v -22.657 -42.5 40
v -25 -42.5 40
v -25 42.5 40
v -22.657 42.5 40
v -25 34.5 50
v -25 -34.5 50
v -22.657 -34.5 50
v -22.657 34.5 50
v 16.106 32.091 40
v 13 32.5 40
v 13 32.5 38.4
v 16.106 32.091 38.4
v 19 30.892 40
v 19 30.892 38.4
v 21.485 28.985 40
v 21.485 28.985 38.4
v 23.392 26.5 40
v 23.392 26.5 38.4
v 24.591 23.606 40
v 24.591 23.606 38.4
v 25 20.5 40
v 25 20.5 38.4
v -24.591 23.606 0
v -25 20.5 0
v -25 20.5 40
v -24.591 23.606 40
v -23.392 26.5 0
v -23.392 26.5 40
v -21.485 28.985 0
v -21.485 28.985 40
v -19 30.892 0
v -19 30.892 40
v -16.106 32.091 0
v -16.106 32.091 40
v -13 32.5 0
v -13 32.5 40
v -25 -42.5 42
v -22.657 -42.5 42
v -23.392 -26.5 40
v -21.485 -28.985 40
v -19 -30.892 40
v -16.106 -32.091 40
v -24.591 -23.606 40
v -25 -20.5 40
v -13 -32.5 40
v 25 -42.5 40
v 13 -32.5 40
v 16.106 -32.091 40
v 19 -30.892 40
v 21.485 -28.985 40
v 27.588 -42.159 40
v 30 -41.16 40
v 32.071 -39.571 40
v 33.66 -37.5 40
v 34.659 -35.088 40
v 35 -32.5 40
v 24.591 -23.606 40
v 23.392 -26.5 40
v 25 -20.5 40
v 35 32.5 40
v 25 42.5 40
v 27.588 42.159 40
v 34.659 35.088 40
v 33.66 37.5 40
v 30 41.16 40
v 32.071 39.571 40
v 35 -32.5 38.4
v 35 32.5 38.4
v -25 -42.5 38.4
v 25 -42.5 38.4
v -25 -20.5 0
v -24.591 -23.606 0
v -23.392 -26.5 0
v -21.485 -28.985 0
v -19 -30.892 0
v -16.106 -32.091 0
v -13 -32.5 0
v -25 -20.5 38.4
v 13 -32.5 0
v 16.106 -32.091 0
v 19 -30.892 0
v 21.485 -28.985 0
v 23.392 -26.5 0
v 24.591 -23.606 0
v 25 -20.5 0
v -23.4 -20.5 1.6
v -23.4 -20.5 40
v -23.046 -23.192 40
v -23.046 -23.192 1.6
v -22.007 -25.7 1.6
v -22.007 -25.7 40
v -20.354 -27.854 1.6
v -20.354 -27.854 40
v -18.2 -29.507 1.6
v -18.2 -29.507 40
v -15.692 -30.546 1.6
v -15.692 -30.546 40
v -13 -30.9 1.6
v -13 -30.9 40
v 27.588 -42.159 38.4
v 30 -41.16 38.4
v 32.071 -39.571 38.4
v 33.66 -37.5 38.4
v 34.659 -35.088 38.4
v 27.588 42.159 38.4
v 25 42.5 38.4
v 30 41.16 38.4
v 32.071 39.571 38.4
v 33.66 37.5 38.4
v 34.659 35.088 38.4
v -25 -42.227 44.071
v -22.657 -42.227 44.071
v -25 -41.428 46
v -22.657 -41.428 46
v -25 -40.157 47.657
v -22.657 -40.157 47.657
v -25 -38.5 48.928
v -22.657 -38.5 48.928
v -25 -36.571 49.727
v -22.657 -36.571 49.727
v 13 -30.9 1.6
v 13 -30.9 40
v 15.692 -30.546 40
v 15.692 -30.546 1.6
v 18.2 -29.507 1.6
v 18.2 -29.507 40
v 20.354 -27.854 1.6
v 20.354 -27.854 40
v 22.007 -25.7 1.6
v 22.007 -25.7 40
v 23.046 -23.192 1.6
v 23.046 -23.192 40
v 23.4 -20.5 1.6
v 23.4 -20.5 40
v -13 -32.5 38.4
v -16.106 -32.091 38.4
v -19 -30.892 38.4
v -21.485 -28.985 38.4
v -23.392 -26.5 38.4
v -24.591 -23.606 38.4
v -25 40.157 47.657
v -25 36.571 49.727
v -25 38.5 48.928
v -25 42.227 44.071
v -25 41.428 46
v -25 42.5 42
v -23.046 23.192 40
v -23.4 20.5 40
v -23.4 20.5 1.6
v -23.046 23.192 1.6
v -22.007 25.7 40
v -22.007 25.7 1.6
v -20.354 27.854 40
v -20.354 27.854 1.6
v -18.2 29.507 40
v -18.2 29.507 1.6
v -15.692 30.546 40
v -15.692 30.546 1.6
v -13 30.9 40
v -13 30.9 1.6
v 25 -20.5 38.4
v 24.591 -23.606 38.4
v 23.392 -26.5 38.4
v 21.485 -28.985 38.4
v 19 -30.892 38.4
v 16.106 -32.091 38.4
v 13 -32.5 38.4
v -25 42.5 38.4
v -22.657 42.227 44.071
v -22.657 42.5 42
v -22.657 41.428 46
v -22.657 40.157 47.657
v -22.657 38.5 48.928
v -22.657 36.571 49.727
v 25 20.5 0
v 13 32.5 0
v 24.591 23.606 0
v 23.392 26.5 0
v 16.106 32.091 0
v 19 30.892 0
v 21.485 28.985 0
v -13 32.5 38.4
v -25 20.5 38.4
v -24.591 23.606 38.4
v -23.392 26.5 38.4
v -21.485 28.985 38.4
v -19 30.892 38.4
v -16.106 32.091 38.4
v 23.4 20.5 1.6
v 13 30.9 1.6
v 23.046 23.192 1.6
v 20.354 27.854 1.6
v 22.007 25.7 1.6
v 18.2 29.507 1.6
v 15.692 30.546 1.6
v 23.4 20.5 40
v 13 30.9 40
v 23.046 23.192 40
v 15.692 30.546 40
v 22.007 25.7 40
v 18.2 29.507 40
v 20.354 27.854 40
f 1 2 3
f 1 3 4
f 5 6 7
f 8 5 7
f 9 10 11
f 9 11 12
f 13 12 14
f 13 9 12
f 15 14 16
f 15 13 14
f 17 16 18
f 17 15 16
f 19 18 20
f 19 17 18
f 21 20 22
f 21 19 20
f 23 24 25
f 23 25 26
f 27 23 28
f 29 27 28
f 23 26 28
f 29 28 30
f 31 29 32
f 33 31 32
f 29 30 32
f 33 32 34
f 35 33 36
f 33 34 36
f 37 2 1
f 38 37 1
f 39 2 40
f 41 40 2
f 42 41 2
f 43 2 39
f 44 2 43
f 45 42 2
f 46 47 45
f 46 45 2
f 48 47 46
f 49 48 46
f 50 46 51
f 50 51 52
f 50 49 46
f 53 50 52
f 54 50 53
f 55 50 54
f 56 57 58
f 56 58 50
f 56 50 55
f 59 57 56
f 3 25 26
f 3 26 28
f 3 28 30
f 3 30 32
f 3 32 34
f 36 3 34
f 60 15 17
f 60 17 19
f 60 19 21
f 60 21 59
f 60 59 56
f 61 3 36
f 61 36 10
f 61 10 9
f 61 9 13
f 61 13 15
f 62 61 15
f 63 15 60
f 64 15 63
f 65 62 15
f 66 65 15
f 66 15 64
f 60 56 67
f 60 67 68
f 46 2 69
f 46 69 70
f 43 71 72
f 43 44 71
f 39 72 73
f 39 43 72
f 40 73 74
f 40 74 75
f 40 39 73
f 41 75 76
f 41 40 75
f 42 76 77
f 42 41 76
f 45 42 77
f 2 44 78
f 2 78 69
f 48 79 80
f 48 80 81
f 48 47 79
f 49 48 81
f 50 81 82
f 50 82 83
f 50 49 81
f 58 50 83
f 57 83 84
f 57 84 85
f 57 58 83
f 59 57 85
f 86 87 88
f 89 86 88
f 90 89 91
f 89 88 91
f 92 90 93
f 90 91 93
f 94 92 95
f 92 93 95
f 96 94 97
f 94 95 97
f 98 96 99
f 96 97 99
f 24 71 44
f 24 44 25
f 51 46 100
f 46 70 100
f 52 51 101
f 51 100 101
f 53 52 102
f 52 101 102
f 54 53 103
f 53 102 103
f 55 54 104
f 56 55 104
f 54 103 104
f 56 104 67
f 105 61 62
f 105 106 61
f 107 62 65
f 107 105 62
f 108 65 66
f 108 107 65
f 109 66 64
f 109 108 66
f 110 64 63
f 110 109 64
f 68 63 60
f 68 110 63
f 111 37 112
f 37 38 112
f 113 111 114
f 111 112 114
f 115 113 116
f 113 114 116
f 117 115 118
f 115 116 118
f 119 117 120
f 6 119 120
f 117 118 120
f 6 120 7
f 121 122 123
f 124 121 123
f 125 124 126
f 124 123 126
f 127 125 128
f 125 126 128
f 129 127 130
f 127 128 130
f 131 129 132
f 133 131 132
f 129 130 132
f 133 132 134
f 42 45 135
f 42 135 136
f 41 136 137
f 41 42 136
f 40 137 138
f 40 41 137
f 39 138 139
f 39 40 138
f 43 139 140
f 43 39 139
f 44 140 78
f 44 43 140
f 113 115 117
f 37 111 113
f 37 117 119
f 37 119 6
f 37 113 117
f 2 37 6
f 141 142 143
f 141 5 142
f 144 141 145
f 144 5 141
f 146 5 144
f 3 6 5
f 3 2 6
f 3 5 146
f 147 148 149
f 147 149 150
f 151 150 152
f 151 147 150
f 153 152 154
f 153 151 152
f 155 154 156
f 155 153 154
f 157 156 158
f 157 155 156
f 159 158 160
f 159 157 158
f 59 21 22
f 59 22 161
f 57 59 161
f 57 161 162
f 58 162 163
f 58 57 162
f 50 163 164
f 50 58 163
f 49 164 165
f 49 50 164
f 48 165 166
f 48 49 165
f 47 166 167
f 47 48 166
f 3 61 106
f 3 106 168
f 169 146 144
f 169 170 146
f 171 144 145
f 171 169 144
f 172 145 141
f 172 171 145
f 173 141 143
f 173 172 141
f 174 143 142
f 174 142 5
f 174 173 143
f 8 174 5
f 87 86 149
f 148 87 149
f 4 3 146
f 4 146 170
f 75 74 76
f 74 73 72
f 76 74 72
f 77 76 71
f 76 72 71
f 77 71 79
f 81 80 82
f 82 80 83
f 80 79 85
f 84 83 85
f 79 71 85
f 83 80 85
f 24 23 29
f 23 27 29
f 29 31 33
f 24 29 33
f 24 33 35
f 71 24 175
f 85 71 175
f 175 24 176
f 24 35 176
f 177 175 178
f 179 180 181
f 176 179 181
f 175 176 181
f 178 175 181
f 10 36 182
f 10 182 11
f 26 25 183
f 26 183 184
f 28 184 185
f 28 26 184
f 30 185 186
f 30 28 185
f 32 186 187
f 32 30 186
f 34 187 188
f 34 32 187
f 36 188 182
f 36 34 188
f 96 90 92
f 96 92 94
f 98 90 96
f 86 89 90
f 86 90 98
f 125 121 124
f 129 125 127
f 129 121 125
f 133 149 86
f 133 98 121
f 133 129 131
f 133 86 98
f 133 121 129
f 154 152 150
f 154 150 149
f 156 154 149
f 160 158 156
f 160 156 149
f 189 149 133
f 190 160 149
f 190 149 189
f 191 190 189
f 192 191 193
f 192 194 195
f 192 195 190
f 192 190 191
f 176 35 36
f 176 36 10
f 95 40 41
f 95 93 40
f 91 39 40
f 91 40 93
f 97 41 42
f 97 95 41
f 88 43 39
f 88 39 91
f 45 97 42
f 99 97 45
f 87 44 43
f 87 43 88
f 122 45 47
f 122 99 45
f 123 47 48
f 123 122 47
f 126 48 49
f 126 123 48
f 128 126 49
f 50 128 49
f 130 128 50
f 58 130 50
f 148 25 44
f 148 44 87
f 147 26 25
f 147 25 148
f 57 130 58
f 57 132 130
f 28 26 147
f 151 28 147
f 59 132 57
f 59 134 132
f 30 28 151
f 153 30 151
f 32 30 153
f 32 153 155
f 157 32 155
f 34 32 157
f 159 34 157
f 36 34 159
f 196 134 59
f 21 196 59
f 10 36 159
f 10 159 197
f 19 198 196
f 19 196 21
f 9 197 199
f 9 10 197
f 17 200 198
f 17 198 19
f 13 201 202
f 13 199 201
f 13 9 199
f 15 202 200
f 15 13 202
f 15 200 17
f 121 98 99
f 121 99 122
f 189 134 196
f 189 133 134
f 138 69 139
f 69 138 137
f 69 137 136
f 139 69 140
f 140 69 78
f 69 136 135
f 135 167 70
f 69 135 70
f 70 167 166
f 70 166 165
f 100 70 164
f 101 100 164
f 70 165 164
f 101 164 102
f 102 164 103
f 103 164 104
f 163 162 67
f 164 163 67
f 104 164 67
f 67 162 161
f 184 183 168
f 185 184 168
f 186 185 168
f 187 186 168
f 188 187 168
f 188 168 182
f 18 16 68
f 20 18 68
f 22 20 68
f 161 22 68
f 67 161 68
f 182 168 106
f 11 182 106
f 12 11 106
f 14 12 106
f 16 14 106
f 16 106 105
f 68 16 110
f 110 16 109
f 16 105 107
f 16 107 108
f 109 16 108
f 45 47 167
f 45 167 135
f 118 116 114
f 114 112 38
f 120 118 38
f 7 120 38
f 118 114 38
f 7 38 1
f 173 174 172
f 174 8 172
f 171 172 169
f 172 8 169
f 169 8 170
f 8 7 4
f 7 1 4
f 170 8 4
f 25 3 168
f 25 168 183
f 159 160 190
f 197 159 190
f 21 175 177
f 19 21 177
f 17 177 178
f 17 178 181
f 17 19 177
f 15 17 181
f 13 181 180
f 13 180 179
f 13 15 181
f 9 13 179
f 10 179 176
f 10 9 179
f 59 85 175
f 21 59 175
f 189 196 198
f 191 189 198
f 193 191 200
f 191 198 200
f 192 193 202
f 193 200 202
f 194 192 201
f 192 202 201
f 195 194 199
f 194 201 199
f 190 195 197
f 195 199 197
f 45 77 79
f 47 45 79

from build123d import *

# Parameters (mm, degrees)
F0_W     = 50
F0_H     = 65
F1_DEPTH = 40
F2_R     = 12
F3_T     = -1.6
F5_DEPTH = 1.6
F6_R     = 10
F7_W     = 2.3431457505
F7_H     = 85
F8_DEPTH = 10
F9_R     = 8


with BuildPart() as f1:
    # F0 (on Top) → F1 (new body)
    with BuildSketch(Plane.XY):
        Rectangle(F0_W, F0_H)
    extrude(amount=F1_DEPTH)

    # F2
    f2_edges = [f1.edges().sort_by_distance(p)[0] for p in [
        (-25, -32.5, 20),
        (25, -32.5, 20),
        (25, 32.5, 20),
        (-25, 32.5, 20),
    ]]
    fillet(f2_edges, radius=F2_R)

    # F3
    f3_openings = [f1.faces().sort_by_distance(p)[0] for p in [
        (0, 0, 40),
    ]]
    offset(amount=F3_T, openings=f3_openings)


with BuildPart() as f5:
    # F4 (on face) → F5 (new body)
    with BuildSketch(Plane.XY.offset(40)):
        with BuildLine():
            Line((35, 42.5), (-25, 42.5))
            Line((-25, 42.5), (-25, 20.5))
            ThreePointArc((-25, 20.5), (-21.4852813742, 28.9852813742), (-13, 32.5))
            Line((-13, 32.5), (13, 32.5))
            ThreePointArc((13, 32.5), (21.4852813742, 28.9852813742), (25, 20.5))
            Line((25, 20.5), (25, -20.5))
            ThreePointArc((25, -20.5), (21.4852813742, -28.9852813742), (13, -32.5))
            Line((13, -32.5), (-13, -32.5))
            ThreePointArc((-13, -32.5), (-21.4852813742, -28.9852813742), (-25, -20.5))
            Line((-25, -20.5), (-25, -42.5))
            Line((-25, -42.5), (35, -42.5))
            Line((35, -42.5), (35, 42.5))
        make_face()
    extrude(amount=-F5_DEPTH)

    # F6
    f6_edges = [f5.edges().sort_by_distance(p)[0] for p in [
        (35, 42.5, 39.2),
        (35, -42.5, 39.2),
    ]]
    fillet(f6_edges, radius=F6_R)


with BuildPart() as f8:
    # F7 (on face) → F8 (new body)
    with BuildSketch(Plane.XY.offset(40)):
        with Locations((-23.8284271247, 0)):
            Rectangle(F7_W, F7_H)
    extrude(amount=F8_DEPTH)

    # F9
    f9_edges = [f8.edges().sort_by_distance(p)[0] for p in [
        (-23.828427, 42.5, 50),
        (-23.828427, -42.5, 50),
    ]]
    fillet(f9_edges, radius=F9_R)


solid = Compound([f1.part, f5.part, f8.part])
